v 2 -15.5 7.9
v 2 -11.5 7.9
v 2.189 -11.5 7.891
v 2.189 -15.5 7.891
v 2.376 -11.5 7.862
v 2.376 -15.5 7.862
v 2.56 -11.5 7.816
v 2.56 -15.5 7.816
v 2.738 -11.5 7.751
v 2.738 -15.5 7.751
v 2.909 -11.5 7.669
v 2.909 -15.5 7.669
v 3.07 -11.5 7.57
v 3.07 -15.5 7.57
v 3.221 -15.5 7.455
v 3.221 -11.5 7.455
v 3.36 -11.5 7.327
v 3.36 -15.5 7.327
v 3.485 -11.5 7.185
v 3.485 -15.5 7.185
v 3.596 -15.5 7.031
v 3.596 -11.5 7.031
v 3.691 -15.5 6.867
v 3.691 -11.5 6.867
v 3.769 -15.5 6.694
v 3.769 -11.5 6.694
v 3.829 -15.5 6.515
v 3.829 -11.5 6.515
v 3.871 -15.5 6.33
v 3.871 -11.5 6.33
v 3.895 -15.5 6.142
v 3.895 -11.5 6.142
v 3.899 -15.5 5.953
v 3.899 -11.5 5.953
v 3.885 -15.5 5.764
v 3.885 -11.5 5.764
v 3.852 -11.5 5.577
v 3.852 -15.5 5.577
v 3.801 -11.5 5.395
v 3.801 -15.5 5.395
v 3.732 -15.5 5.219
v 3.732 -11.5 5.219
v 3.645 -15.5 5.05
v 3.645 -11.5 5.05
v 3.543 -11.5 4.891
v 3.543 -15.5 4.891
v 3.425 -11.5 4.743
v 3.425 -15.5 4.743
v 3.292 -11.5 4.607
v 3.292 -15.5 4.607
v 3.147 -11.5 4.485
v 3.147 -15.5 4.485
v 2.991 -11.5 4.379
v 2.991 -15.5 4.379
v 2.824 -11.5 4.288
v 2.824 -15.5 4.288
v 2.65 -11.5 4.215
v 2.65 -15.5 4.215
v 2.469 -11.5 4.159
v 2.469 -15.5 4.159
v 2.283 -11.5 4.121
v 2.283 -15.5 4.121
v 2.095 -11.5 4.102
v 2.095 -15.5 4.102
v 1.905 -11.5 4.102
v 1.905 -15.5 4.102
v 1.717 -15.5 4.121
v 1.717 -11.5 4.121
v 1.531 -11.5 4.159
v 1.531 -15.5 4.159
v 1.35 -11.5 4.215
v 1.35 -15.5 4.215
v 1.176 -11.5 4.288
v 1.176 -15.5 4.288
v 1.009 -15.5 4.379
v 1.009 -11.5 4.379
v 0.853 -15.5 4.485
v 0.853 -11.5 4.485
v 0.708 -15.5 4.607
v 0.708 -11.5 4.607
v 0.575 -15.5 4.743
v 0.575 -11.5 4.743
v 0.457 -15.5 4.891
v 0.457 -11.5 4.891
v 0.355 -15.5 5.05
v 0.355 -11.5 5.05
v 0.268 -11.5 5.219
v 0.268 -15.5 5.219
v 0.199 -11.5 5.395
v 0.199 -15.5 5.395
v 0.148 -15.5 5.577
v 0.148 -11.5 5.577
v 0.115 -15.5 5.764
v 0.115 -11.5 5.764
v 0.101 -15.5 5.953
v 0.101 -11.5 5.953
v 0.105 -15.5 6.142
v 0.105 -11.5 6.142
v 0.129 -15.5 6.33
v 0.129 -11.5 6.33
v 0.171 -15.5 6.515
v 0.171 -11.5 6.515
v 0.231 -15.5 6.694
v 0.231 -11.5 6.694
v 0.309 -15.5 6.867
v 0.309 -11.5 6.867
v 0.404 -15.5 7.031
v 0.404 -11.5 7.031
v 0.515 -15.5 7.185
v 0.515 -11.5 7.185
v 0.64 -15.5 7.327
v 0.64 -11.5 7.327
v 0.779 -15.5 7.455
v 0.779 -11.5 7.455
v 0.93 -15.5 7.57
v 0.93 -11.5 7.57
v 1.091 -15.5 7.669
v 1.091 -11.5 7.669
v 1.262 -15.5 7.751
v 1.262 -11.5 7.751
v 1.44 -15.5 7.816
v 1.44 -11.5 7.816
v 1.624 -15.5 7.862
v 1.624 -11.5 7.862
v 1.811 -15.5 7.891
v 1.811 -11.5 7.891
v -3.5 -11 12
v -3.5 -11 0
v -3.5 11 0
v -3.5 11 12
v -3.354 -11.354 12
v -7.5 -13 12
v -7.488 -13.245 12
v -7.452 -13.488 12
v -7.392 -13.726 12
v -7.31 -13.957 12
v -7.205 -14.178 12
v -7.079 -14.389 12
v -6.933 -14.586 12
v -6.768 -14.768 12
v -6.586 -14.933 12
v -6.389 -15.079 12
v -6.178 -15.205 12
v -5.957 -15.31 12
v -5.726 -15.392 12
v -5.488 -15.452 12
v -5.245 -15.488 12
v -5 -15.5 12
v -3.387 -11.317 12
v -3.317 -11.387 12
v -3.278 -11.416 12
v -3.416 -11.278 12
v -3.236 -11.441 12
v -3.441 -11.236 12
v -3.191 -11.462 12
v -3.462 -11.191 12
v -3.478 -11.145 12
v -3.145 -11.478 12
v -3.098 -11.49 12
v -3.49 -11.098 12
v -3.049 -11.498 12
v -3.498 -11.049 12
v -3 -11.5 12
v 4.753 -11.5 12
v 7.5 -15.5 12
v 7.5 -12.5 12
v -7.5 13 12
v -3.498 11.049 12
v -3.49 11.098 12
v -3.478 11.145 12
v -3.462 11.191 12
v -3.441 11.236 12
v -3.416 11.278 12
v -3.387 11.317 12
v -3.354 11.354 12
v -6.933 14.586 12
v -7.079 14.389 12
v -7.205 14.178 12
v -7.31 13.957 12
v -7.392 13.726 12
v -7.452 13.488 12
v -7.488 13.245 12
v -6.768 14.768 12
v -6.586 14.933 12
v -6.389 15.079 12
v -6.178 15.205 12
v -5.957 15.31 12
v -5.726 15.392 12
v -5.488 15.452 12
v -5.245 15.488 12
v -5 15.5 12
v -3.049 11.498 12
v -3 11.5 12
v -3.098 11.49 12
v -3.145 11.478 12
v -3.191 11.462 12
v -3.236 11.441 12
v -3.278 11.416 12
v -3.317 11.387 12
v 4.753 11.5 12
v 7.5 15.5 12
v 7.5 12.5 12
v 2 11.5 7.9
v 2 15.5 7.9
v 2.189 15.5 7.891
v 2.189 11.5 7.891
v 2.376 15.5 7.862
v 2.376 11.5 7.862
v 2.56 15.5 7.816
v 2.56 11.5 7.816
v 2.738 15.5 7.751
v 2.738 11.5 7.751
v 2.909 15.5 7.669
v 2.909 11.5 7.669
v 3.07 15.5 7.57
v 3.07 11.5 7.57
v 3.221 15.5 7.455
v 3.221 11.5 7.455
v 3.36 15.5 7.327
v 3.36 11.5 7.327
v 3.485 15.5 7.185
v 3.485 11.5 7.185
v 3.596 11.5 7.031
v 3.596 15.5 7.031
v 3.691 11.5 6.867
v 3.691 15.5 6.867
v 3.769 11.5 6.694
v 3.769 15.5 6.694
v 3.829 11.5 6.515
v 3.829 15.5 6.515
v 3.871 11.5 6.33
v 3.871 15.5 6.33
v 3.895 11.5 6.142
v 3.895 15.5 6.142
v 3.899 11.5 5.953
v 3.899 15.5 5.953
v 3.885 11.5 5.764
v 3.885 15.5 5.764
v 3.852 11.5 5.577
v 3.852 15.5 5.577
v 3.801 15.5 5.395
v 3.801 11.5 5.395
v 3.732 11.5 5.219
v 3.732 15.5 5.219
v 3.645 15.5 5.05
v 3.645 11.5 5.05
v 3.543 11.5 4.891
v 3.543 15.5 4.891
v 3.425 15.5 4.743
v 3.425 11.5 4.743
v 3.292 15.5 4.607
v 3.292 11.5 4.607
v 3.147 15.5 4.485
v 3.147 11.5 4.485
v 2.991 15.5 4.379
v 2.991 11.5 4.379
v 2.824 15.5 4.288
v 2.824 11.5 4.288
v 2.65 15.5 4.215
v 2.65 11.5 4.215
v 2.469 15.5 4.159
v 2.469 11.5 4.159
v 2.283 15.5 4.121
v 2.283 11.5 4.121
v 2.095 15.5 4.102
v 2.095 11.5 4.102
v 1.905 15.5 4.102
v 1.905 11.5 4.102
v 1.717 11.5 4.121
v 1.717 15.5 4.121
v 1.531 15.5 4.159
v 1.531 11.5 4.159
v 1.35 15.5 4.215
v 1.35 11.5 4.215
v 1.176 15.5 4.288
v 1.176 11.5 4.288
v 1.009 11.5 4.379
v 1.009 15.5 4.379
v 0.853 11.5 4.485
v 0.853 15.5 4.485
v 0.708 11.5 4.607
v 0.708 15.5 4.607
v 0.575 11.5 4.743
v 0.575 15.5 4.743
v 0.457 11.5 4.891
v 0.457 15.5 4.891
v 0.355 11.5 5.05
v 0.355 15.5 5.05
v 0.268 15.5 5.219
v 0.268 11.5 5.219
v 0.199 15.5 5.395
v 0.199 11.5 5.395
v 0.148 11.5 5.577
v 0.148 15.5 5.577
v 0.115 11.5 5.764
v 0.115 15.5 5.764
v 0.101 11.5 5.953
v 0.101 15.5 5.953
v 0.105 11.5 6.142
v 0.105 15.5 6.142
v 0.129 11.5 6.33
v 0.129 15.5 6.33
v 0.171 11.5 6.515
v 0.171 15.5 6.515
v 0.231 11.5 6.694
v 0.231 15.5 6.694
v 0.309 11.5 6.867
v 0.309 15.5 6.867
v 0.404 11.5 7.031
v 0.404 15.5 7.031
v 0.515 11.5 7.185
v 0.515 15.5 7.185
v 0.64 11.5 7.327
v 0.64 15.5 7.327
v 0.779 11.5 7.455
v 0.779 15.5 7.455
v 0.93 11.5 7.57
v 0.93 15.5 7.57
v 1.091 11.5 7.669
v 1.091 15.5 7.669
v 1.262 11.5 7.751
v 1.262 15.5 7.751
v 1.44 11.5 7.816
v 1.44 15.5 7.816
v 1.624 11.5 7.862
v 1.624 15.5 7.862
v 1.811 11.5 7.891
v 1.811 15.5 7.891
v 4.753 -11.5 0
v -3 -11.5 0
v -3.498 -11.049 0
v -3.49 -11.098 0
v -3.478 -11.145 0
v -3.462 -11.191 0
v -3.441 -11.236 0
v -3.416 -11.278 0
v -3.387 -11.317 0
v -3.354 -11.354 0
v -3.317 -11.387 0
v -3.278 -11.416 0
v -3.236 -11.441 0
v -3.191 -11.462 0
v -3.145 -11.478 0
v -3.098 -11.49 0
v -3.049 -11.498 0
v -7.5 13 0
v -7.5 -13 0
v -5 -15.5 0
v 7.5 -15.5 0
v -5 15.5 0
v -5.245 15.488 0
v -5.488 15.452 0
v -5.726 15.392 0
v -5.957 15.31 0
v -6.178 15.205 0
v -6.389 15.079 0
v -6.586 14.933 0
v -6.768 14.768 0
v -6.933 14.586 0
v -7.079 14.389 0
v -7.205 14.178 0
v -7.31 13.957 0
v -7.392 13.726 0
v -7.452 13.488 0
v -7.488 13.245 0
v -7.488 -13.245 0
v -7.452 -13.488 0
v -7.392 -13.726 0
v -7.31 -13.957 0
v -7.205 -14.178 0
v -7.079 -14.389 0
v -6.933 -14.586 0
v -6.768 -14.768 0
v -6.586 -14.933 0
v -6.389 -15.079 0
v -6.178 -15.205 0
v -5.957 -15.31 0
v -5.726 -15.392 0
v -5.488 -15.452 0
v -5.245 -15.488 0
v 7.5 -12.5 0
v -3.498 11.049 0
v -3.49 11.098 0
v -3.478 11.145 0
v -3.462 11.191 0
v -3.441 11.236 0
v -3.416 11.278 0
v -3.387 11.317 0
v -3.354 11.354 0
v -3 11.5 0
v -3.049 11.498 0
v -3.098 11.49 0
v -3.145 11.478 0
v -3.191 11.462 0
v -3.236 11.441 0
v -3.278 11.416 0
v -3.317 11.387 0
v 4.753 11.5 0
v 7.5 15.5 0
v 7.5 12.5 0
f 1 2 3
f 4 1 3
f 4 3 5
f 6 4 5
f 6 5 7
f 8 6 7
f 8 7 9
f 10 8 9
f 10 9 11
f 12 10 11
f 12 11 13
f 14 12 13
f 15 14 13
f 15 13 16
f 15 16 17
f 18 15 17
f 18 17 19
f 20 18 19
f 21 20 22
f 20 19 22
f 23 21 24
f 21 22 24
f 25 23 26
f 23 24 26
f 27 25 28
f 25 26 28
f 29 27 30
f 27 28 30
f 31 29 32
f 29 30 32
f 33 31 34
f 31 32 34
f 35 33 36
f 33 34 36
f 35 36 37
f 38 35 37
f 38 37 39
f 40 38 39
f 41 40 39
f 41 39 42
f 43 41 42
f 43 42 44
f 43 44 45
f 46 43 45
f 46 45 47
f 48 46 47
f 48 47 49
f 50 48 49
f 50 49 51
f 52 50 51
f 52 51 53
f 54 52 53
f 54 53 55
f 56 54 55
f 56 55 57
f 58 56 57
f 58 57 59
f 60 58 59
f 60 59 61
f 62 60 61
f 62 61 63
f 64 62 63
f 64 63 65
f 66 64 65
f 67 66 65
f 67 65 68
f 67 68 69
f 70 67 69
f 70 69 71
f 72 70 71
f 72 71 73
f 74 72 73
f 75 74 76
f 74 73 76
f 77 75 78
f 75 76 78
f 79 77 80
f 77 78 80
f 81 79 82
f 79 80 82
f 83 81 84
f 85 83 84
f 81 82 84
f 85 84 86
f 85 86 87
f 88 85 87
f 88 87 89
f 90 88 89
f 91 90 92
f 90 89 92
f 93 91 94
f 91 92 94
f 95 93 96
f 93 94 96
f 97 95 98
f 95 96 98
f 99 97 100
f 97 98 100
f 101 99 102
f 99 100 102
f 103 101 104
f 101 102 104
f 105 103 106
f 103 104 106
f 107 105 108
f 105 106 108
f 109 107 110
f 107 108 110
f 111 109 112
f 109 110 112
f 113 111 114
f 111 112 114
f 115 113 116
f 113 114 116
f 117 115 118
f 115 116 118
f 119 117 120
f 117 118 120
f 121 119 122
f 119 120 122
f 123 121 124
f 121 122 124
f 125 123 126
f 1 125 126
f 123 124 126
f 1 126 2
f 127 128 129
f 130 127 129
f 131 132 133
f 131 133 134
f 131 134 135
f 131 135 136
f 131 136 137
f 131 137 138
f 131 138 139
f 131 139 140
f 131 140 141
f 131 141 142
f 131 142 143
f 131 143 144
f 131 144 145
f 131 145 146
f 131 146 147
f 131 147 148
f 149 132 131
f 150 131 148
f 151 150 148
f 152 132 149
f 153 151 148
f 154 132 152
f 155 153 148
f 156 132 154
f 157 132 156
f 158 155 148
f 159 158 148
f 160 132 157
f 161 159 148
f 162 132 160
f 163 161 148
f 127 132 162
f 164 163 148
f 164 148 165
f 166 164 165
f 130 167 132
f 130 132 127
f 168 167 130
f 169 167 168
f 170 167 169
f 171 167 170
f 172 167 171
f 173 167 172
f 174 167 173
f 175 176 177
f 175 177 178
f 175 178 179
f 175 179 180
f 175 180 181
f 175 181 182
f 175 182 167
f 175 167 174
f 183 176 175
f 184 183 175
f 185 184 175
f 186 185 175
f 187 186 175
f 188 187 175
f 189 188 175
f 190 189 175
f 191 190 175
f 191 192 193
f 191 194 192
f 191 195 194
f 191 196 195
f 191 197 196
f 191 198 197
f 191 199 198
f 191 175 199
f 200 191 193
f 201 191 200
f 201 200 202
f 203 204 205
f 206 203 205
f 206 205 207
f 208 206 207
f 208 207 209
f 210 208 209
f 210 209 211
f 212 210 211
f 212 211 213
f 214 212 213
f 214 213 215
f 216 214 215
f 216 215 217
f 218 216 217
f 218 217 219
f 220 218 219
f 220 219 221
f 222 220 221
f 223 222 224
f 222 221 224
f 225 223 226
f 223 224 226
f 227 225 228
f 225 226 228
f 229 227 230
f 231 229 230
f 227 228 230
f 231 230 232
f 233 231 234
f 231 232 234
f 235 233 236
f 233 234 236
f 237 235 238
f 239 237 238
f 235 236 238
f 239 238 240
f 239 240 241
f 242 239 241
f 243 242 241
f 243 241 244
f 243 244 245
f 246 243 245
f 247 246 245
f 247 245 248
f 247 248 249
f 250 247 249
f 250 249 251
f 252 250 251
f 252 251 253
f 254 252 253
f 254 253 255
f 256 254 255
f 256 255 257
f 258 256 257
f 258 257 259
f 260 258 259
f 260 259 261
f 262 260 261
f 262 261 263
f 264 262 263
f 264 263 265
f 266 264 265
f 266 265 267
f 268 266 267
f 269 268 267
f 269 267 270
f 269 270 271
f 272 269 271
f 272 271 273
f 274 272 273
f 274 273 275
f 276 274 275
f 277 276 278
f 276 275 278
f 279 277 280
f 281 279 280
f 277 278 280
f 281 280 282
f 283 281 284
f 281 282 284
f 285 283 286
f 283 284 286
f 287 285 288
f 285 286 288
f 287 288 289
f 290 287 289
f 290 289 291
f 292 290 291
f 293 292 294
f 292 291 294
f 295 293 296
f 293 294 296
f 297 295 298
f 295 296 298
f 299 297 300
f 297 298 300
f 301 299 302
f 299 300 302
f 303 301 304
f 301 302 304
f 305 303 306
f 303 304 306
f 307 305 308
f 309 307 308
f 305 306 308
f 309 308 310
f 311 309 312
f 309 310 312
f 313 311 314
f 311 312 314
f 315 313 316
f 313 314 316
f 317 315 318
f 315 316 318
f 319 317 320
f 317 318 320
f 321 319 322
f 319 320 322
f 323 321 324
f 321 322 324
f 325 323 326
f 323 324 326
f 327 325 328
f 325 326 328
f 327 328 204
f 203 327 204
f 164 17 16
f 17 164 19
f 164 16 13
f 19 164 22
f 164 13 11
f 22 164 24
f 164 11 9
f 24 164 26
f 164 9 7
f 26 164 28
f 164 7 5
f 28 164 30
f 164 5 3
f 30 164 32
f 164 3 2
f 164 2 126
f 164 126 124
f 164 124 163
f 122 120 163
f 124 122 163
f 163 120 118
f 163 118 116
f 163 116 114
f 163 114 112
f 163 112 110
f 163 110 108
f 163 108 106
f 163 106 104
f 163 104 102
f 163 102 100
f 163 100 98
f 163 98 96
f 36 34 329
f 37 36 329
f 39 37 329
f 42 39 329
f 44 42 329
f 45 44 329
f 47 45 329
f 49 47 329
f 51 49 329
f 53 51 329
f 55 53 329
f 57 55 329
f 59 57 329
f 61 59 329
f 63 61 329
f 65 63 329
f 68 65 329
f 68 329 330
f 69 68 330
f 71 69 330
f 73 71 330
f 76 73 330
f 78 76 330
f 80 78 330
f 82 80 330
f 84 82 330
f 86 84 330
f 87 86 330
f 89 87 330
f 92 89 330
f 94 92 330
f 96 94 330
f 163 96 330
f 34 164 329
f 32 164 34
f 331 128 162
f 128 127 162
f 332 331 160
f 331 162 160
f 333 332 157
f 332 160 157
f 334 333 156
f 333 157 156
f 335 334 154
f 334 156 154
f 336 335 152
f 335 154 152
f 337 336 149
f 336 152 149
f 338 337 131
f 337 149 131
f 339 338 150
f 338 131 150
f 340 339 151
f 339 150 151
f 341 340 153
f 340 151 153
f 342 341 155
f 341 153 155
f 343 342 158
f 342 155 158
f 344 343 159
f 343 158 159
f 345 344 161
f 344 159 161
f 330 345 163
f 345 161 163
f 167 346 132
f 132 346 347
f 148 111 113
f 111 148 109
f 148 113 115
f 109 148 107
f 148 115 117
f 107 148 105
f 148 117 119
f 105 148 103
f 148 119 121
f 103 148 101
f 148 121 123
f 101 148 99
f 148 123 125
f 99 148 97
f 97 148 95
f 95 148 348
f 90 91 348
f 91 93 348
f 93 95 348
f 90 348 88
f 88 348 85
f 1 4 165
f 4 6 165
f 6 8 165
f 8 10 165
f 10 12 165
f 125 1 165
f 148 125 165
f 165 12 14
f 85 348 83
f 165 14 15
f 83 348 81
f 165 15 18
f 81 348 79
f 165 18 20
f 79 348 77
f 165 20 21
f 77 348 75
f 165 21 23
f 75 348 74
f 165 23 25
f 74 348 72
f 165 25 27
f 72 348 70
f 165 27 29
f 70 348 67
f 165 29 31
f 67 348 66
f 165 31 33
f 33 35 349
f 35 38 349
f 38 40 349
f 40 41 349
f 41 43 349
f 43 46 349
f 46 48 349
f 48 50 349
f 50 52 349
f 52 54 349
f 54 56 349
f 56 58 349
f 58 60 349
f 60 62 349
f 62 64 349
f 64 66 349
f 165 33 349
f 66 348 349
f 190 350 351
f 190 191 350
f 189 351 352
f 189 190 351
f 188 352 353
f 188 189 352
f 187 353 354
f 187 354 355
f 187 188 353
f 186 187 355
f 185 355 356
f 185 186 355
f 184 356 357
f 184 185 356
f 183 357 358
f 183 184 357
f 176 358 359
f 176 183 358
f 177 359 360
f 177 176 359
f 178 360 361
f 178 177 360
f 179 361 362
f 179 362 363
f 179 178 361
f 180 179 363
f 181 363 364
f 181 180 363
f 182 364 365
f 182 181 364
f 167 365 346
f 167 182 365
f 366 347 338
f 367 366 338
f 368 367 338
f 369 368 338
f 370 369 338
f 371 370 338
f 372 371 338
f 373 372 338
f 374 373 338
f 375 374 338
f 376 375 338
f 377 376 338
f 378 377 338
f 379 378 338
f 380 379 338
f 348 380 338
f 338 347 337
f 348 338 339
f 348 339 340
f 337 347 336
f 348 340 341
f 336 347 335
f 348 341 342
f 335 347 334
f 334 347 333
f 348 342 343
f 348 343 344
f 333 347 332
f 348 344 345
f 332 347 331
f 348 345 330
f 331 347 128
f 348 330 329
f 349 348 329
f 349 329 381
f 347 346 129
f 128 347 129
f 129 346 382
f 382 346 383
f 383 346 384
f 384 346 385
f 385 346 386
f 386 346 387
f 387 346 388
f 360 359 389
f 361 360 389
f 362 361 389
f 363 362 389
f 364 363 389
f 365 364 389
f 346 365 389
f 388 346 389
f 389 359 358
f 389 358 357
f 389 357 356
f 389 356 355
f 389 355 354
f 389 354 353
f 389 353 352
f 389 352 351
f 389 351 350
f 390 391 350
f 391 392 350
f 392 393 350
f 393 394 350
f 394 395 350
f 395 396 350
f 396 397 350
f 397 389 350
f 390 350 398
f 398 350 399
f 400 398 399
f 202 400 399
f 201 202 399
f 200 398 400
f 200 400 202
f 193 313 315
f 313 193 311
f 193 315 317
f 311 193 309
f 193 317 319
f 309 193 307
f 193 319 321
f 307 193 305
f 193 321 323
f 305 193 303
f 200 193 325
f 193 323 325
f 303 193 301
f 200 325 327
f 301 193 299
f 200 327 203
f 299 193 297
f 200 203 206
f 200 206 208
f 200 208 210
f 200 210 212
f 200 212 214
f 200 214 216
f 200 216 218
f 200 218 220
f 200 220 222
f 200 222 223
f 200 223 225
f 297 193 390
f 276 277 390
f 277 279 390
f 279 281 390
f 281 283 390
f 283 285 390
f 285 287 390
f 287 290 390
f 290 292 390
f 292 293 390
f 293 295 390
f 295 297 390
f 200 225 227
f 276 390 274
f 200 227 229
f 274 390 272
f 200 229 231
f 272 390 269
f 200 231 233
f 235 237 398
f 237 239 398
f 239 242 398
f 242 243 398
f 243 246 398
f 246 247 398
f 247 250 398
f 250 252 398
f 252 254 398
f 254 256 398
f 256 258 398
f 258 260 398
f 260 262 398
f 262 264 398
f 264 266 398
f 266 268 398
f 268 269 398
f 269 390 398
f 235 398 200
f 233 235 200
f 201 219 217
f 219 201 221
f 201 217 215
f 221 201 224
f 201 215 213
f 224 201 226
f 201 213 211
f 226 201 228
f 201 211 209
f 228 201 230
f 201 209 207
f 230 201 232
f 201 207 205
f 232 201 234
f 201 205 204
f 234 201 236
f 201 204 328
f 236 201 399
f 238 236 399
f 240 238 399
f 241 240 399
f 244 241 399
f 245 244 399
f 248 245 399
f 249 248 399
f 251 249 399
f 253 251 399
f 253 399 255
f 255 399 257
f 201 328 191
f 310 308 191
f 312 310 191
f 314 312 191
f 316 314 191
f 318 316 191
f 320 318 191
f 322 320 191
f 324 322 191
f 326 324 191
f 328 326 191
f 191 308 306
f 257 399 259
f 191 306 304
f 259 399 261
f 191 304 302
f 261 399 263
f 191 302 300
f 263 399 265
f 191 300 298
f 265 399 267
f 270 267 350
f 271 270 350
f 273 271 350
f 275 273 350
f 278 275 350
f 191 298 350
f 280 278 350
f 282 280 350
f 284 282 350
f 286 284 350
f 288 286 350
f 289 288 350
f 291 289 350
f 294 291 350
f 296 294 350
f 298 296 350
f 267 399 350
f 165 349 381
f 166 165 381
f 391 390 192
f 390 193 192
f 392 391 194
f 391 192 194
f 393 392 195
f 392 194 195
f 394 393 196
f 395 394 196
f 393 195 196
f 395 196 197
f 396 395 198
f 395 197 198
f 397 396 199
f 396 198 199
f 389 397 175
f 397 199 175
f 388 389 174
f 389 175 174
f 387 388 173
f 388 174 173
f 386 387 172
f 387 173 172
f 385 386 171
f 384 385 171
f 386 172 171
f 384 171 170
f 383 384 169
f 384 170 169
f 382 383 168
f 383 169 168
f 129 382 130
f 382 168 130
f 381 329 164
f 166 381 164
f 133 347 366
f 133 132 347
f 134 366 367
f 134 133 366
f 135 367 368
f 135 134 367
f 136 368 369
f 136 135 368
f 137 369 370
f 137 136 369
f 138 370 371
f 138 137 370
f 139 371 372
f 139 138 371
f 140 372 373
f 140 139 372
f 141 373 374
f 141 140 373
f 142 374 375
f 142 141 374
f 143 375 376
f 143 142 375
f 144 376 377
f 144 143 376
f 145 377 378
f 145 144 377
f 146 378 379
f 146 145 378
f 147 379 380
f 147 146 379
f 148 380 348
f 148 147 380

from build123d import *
from OCP.BRepFilletAPI import BRepFilletAPI_MakeChamfer

# Parameters (mm, degrees)
SALIENTE_EXTRUIR1_DEPTH = 12
CROQUIS2_R              = 1.9
CORTAR_EXTRUIR1_DEPTH   = 35.077118423
REDONDEO1_R             = 0.5
REDONDEO2_R             = 2.5
CHAFL_N1_SIZE           = 1
CHAFL_N1_SIZE2          = 2.747477419


with BuildPart() as part:
    # Croquis1 → Saliente-Extruir1 (new body)
    with BuildSketch(Plane.XY):
        Polygon((-3.5, 11.5), (3.5, 11.5), (7.5, 11.5), (7.5, 15.5), (-7.5, 15.5), (-7.5, -15.5), (7.5, -15.5), (7.5, -11.5), (3.5, -11.5), (-3.5, -11.5), align=None)
    extrude(amount=SALIENTE_EXTRUIR1_DEPTH)

    # Croquis2 → Cortar-Extruir1 (cut, through all)
    with BuildSketch(Plane(origin=(0, 15.5, 0), x_dir=(1, 0, 0), z_dir=(0, 1, 0))):
        with Locations(Location((2, -6, 0), (0, 0, 270))):
            Circle(CROQUIS2_R)
    extrude(amount=-CORTAR_EXTRUIR1_DEPTH, mode=Mode.SUBTRACT)

    # Redondeo1
    redondeo1_edges = [part.edges().sort_by_distance(p)[0] for p in [
        (-3.5, 11.5, 6),
        (-3.5, -11.5, 6),
    ]]
    fillet(redondeo1_edges, radius=REDONDEO1_R)

    # Redondeo2
    redondeo2_edges = [part.edges().sort_by_distance(p)[0] for p in [
        (-7.5, -15.5, 6),
        (-7.5, 15.5, 6),
    ]]
    fillet(redondeo2_edges, radius=REDONDEO2_R)

    # Chaflán1: one chamfer whose edges measure the first distance from different faces: ONE call of the kernel's chamfer builder (chamfer() names one face for all edges)
    chafl_n1_edges_1 = [part.edges().sort_by_distance(p)[0] for p in [
        (7.5, -11.5, 6),
    ]]
    chafl_n1_side_1 = [part.faces().sort_by_distance(p)[0] for p in [
        (7.5, -13.5, 6),
    ]]
    chafl_n1_edges_2 = [part.edges().sort_by_distance(p)[0] for p in [
        (7.5, 11.5, 6),
    ]]
    chafl_n1_side_2 = [part.faces().sort_by_distance(p)[0] for p in [
        (7.5, 13.5, 6),
    ]]
    chafl_n1 = BRepFilletAPI_MakeChamfer(part.part.solid().wrapped)
    for e in chafl_n1_edges_1:
        chafl_n1.Add(CHAFL_N1_SIZE, CHAFL_N1_SIZE2, e.wrapped, chafl_n1_side_1[0].wrapped)  # the first distance lies on this face
    for e in chafl_n1_edges_2:
        chafl_n1.Add(CHAFL_N1_SIZE, CHAFL_N1_SIZE2, e.wrapped, chafl_n1_side_2[0].wrapped)  # the first distance lies on this face
    add(Compound.cast(chafl_n1.Shape()), mode=Mode.REPLACE)


solid = part.part
